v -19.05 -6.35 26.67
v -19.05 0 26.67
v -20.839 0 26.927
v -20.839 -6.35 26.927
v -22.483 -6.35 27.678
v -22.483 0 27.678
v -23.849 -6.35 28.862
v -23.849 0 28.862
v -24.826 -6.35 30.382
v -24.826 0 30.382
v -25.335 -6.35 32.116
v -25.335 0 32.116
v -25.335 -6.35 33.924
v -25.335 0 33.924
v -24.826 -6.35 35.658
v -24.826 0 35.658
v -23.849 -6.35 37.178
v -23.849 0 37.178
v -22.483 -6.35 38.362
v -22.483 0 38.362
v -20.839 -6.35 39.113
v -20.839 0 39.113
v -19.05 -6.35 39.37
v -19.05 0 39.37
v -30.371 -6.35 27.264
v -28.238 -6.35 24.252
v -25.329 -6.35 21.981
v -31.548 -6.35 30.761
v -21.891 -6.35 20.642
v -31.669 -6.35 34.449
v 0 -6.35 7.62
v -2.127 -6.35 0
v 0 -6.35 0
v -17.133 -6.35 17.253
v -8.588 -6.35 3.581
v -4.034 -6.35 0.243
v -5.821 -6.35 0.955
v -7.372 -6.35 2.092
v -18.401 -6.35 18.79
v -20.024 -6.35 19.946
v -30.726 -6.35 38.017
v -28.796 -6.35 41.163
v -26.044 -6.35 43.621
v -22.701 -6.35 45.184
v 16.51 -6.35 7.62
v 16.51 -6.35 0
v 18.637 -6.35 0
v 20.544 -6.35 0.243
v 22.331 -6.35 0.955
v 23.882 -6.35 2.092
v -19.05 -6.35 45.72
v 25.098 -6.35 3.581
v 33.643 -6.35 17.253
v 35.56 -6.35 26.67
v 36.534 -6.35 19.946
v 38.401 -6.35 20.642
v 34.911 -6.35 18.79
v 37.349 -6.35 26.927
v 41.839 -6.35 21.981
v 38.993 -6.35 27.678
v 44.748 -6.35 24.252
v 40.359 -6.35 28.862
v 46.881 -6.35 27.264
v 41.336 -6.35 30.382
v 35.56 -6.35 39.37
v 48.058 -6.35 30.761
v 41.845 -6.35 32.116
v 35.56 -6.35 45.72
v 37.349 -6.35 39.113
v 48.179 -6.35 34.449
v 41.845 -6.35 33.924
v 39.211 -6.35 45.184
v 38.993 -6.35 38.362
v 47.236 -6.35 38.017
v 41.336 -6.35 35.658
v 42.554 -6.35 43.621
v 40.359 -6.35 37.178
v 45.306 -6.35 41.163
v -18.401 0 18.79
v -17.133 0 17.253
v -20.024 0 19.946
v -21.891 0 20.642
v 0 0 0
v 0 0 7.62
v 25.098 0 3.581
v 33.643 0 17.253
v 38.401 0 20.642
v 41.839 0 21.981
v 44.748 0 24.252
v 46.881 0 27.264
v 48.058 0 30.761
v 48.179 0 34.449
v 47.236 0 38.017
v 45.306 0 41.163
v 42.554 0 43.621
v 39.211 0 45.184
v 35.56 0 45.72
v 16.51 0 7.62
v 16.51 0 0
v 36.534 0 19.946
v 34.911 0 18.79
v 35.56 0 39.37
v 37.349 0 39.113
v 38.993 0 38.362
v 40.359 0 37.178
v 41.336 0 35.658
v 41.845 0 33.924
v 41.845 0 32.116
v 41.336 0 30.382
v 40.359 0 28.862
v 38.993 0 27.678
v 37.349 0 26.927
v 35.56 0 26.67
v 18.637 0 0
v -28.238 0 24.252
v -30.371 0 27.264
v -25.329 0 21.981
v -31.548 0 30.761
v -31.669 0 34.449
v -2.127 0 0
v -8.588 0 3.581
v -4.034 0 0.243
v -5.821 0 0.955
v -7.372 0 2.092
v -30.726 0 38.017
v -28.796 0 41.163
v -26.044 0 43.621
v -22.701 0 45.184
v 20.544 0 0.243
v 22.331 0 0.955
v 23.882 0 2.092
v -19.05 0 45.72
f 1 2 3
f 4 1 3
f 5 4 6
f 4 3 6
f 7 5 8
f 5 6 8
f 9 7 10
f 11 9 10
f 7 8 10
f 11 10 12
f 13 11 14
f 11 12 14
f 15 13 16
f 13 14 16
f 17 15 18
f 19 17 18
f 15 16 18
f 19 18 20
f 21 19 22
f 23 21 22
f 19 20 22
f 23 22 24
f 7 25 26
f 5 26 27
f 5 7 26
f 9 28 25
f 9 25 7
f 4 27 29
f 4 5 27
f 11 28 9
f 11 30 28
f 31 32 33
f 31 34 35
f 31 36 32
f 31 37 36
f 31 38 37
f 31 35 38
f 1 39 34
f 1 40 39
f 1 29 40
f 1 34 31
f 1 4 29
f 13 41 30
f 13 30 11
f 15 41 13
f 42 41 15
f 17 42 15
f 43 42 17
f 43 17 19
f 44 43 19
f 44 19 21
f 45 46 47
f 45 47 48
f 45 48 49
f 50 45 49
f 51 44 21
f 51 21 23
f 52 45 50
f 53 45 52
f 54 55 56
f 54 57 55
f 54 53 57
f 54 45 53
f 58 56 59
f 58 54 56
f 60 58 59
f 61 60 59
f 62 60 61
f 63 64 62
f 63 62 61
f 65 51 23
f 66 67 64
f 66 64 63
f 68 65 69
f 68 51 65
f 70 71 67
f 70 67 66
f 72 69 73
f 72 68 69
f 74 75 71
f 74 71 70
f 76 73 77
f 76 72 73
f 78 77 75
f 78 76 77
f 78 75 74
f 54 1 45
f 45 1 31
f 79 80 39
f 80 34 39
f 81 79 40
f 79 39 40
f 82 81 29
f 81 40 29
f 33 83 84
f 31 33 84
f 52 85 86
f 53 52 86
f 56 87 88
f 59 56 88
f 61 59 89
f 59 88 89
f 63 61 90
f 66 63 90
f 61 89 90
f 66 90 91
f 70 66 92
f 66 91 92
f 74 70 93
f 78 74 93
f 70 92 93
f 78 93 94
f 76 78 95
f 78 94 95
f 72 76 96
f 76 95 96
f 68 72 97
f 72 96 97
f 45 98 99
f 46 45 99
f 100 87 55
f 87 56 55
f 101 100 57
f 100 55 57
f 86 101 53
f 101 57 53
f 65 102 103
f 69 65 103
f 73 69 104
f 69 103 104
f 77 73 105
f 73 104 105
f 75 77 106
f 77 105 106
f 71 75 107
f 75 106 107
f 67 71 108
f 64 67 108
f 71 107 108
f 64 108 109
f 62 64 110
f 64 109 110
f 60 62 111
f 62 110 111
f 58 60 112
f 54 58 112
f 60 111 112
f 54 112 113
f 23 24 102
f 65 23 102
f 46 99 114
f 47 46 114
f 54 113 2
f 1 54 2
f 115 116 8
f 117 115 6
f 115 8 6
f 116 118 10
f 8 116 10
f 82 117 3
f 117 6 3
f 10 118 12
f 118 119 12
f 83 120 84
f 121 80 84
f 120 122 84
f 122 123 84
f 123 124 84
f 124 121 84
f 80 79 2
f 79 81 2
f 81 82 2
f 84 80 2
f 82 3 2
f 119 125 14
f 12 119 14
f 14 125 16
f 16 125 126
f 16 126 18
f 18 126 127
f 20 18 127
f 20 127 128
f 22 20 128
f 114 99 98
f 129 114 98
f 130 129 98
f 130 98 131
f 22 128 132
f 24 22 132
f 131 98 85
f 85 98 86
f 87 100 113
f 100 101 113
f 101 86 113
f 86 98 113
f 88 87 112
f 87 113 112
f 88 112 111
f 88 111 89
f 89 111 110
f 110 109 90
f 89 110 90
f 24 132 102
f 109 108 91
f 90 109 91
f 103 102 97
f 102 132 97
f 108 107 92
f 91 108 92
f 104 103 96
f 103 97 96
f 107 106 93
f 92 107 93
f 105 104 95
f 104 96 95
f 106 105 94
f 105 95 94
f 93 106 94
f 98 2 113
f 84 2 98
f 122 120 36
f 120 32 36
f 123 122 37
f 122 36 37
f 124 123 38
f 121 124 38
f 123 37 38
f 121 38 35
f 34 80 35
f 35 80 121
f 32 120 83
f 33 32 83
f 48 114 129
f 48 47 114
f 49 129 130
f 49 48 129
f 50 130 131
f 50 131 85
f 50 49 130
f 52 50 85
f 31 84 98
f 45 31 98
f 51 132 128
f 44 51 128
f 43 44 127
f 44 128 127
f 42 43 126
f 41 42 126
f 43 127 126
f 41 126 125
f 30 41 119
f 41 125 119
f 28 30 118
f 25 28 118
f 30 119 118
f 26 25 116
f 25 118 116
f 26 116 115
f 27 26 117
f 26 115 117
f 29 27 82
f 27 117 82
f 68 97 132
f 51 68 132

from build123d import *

# Parameters (mm, degrees)
F1_DEPTH = 6.35
F2_R     = 7.62


with BuildPart() as f1:
    # F0 (on Front) → F1 (new body)
    with BuildSketch(Plane.XZ):
        with BuildLine():
            Line((-6.35, 0), (0, 0))
            Line((0, 0), (0, 7.62))
            Line((0, 7.62), (16.51, 7.62))
            Line((16.51, 7.62), (16.51, 0))
            Line((16.51, 0), (22.86, 0))
            Line((22.86, 0), (35.56, 20.32))
            ThreePointArc((35.56, 20.32), (48.26, 33.02), (35.56, 45.72))
            Line((35.56, 45.72), (-19.05, 45.72))
            ThreePointArc((-19.05, 45.72), (-31.75, 33.02), (-19.05, 20.32))
            Line((-19.05, 20.32), (-6.35, 0))
        make_face()
        with BuildLine():
            Line((35.56, 26.67), (-19.05, 26.67))
            ThreePointArc((-19.05, 26.67), (-25.4, 33.02), (-19.05, 39.37))
            Line((-19.05, 39.37), (35.56, 39.37))
            ThreePointArc((35.56, 39.37), (41.91, 33.02), (35.56, 26.67))
        make_face(mode=Mode.SUBTRACT)
    extrude(amount=F1_DEPTH)

    # F2
    f2_edges = [f1.edges().sort_by_distance(p)[0] for p in [
        (22.86, -3.175, 0),
        (-6.35, -3.175, 0),
        (35.56, -3.175, 20.32),
        (-19.05, -3.175, 20.32),
    ]]
    fillet(f2_edges, radius=F2_R)


solid = f1.part
